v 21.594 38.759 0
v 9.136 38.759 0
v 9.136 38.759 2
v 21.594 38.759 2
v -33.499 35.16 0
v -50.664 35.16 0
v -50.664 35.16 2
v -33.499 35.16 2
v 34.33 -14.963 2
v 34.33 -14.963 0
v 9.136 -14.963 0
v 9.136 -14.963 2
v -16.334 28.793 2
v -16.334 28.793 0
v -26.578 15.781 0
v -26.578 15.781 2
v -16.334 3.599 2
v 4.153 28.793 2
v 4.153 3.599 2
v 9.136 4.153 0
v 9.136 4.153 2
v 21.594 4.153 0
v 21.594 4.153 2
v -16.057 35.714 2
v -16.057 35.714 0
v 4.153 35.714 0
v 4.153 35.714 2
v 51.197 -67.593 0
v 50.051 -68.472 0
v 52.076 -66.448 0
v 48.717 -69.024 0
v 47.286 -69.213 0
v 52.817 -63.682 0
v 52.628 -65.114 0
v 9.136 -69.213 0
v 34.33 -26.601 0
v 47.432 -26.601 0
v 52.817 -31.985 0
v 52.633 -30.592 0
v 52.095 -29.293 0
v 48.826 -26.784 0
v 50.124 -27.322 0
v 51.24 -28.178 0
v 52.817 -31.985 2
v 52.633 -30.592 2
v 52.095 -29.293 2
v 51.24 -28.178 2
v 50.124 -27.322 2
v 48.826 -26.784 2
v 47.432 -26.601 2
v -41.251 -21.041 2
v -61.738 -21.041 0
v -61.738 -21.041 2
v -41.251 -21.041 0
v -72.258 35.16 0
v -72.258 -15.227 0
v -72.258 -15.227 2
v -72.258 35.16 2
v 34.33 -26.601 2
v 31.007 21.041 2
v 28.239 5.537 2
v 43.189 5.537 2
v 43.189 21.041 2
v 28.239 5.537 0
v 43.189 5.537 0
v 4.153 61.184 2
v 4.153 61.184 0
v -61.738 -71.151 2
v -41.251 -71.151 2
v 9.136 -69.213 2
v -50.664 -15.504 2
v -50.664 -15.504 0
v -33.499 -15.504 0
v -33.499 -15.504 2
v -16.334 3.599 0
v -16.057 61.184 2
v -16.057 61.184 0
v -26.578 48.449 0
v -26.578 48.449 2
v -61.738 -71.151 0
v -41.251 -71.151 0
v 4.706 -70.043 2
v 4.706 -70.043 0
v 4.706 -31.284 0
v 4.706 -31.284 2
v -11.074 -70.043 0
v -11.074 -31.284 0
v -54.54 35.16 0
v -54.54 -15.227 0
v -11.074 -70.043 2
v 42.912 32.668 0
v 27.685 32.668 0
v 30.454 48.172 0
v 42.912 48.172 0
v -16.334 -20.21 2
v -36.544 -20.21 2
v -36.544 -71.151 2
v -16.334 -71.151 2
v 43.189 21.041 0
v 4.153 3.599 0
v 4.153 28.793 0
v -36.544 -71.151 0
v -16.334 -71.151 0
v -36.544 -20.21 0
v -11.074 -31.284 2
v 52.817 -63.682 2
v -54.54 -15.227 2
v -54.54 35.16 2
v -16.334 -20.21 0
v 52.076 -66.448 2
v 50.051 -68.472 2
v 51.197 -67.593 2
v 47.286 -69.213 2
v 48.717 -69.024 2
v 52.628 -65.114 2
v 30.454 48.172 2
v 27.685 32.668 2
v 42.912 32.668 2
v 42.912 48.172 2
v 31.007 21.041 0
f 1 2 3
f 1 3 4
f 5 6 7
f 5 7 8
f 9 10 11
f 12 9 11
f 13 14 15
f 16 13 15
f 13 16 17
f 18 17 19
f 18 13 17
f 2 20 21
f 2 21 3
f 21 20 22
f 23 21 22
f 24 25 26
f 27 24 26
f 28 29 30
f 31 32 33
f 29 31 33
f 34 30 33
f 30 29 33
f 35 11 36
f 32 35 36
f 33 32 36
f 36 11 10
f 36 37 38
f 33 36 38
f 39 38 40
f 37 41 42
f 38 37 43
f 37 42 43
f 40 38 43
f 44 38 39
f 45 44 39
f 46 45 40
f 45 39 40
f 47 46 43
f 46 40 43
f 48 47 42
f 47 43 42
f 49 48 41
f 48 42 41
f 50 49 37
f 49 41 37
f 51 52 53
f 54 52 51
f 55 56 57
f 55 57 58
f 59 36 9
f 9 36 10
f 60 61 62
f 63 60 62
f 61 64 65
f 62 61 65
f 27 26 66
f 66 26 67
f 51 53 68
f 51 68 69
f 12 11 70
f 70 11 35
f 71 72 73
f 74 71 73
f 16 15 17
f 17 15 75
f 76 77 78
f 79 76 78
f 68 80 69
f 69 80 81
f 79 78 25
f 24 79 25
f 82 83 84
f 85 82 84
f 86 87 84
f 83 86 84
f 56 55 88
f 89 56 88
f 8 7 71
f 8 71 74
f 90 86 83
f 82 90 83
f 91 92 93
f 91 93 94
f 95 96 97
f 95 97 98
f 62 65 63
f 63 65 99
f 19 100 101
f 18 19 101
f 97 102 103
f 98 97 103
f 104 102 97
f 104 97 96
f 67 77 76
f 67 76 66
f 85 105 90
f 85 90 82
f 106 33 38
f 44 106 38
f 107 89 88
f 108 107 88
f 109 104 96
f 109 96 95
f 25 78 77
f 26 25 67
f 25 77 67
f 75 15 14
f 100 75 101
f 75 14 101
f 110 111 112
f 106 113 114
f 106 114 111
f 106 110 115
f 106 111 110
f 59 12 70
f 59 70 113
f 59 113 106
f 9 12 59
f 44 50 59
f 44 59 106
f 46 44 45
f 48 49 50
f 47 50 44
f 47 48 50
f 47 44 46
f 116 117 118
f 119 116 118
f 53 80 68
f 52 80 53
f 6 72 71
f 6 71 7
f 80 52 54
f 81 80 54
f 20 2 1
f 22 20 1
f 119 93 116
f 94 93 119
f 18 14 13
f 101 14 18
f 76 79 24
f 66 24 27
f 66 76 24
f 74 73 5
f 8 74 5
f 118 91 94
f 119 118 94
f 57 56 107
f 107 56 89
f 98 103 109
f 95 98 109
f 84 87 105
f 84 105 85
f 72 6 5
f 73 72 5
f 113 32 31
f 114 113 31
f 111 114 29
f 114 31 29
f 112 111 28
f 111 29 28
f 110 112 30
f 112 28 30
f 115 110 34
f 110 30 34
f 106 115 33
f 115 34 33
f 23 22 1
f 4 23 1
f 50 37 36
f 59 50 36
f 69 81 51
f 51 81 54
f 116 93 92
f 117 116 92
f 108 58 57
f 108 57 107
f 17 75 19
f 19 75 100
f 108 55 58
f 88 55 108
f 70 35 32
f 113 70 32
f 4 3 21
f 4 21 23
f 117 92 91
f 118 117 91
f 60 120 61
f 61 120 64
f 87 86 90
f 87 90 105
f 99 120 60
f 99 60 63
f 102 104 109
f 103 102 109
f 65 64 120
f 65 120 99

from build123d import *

# Parameters (mm, degrees)
F0_W      = 20.4869881272
F0_H      = 50.1100718975
F1_DEPTH  = 2
F0_W_2    = 20.2101375908
F0_H_2    = 50.9406253695
F2_W      = 17.7184790373
F2_H      = 50.386922434
F3_DEPTH  = 2
F2_W_2    = 17.1647779644
F2_H_2    = 50.6637729704
F4_W      = 20.4869909212
F4_H      = 25.1934616826
F5_DEPTH  = 2
F4_W_2    = 20.2101385221
F4_H_2    = 25.4703126848
F6_W      = 15.7805192284
F6_H      = 38.7591682374
F7_DEPTH  = 2
F8_W      = 12.4583039433
F8_H      = 34.6064004116
F9_DEPTH  = 2
F11_DEPTH = 2
F12_W     = 12.1814515442
F12_H     = 15.5036705546
F13_DEPTH = 2
F12_W_2   = 12.4583058059
F12_H_2   = 15.503667295


with BuildPart() as f1:
    # F0 (on Top) → F1 (new body)
    with BuildSketch(Plane.XY):
        with Locations((-51.4943264425, -46.0957288742)):
            Rectangle(F0_W, F0_H)
    extrude(amount=F1_DEPTH)


with BuildPart() as f1b:
    # F0 (on Top) → F1, piece 2 (new body)
    with BuildSketch(Plane.XY):
        with Locations((-26.439291425, -45.6804521382)):
            Rectangle(F0_W_2, F0_H_2)
    extrude(amount=F1_DEPTH)


with BuildPart() as f3:
    # F2 (on Top) → F3 (new body)
    with BuildSketch(Plane.XY):
        with Locations((-63.3989274502, 9.9666444585)):
            Rectangle(F2_W, F2_H)
    extrude(amount=F3_DEPTH)


with BuildPart() as f3b:
    # F2 (on Top) → F3, piece 2 (new body)
    with BuildSketch(Plane.XY):
        with Locations((-42.0813839883, 9.8282191902)):
            Rectangle(F2_W_2, F2_H_2)
    extrude(amount=F3_DEPTH)


with BuildPart() as f5:
    # F4 (on Top) → F5 (new body)
    with BuildSketch(Plane.XY):
        with Locations((-6.0907271691, 16.1957957316)):
            Rectangle(F4_W, F4_H)
        Polygon((-26.5777166933, 15.7805196941), (-16.3342226297, 3.5990648903), (-16.3342226297, 28.7925265729), align=None)
    extrude(amount=F5_DEPTH)


with BuildPart() as f5b:
    # F4 (on Top) → F5, piece 2 (new body)
    with BuildSketch(Plane.XY):
        with Locations((-5.9523009695, 48.4489630908)):
            Rectangle(F4_W_2, F4_H_2)
        Polygon((-26.5777166933, 48.4489612281), (-16.0573702306, 35.7138067484), (-16.0573702306, 61.1841194332), align=None)
    extrude(amount=F5_DEPTH)


with BuildPart() as f7:
    # F6 (on Top) → F7 (new body)
    with BuildSketch(Plane.XY):
        with Locations((-3.1837888528, -50.6637711078)):
            Rectangle(F6_W, F6_H)
    extrude(amount=F7_DEPTH)


with BuildPart() as f9:
    # F8 (on Top) → F9 (new body)
    with BuildSketch(Plane.XY):
        with Locations((15.3652420267, 21.4559680317)):
            Rectangle(F8_W, F8_H)
    extrude(amount=F9_DEPTH)


with BuildPart() as f11:
    # F10 (on Top) → F11 (new body)
    with BuildSketch(Plane.XY):
        Polygon((9.1360900551, -14.9632263929), (9.1360900551, -69.2128017545), (34.3295484781, -69.2128017545), (34.3295484781, -26.6008017545), (34.3295484781, -14.9632263929), align=None)
        with BuildLine():
            Line((34.3295484781, -26.6008017545), (34.3295484781, -69.2128017545))
            Line((34.3295484781, -69.2128017545), (47.286027726, -69.2128017545))
            ThreePointArc((47.286027726, -69.2128017545), (51.1966959215, -67.59294995), (52.816547726, -63.6822817545))
            Line((52.816547726, -63.6822817545), (52.816547726, -31.9850617545))
            ThreePointArc((52.816547726, -31.9850617545), (51.2395344837, -28.1778149968), (47.432287726, -26.6008017545))
            Line((47.432287726, -26.6008017545), (34.3295484781, -26.6008017545))
        make_face()
    extrude(amount=F11_DEPTH)


with BuildPart() as f13:
    # F12 (on Top) → F13 (new body)
    with BuildSketch(Plane.XY):
        with Locations((37.0980622247, 13.2888595108)):
            Rectangle(F12_W, F12_H)
        Polygon((28.2388255, 5.5370242335), (31.0073364526, 5.5370242335), (31.0073364526, 21.0406947881), align=None)
    extrude(amount=F13_DEPTH)


with BuildPart() as f13b:
    # F12 (on Top) → F13, piece 2 (new body)
    with BuildSketch(Plane.XY):
        with Locations((36.68278642, 40.4202789068)):
            Rectangle(F12_W_2, F12_H_2)
        Polygon((27.6851207018, 32.6684452593), (30.453633517, 32.6684452593), (30.453633517, 48.1721125543), align=None)
    extrude(amount=F13_DEPTH)


solid = Compound([f1.part, f1b.part, f3.part, f3b.part, f5.part, f5b.part, f7.part, f9.part, f11.part, f13.part, f13b.part])
